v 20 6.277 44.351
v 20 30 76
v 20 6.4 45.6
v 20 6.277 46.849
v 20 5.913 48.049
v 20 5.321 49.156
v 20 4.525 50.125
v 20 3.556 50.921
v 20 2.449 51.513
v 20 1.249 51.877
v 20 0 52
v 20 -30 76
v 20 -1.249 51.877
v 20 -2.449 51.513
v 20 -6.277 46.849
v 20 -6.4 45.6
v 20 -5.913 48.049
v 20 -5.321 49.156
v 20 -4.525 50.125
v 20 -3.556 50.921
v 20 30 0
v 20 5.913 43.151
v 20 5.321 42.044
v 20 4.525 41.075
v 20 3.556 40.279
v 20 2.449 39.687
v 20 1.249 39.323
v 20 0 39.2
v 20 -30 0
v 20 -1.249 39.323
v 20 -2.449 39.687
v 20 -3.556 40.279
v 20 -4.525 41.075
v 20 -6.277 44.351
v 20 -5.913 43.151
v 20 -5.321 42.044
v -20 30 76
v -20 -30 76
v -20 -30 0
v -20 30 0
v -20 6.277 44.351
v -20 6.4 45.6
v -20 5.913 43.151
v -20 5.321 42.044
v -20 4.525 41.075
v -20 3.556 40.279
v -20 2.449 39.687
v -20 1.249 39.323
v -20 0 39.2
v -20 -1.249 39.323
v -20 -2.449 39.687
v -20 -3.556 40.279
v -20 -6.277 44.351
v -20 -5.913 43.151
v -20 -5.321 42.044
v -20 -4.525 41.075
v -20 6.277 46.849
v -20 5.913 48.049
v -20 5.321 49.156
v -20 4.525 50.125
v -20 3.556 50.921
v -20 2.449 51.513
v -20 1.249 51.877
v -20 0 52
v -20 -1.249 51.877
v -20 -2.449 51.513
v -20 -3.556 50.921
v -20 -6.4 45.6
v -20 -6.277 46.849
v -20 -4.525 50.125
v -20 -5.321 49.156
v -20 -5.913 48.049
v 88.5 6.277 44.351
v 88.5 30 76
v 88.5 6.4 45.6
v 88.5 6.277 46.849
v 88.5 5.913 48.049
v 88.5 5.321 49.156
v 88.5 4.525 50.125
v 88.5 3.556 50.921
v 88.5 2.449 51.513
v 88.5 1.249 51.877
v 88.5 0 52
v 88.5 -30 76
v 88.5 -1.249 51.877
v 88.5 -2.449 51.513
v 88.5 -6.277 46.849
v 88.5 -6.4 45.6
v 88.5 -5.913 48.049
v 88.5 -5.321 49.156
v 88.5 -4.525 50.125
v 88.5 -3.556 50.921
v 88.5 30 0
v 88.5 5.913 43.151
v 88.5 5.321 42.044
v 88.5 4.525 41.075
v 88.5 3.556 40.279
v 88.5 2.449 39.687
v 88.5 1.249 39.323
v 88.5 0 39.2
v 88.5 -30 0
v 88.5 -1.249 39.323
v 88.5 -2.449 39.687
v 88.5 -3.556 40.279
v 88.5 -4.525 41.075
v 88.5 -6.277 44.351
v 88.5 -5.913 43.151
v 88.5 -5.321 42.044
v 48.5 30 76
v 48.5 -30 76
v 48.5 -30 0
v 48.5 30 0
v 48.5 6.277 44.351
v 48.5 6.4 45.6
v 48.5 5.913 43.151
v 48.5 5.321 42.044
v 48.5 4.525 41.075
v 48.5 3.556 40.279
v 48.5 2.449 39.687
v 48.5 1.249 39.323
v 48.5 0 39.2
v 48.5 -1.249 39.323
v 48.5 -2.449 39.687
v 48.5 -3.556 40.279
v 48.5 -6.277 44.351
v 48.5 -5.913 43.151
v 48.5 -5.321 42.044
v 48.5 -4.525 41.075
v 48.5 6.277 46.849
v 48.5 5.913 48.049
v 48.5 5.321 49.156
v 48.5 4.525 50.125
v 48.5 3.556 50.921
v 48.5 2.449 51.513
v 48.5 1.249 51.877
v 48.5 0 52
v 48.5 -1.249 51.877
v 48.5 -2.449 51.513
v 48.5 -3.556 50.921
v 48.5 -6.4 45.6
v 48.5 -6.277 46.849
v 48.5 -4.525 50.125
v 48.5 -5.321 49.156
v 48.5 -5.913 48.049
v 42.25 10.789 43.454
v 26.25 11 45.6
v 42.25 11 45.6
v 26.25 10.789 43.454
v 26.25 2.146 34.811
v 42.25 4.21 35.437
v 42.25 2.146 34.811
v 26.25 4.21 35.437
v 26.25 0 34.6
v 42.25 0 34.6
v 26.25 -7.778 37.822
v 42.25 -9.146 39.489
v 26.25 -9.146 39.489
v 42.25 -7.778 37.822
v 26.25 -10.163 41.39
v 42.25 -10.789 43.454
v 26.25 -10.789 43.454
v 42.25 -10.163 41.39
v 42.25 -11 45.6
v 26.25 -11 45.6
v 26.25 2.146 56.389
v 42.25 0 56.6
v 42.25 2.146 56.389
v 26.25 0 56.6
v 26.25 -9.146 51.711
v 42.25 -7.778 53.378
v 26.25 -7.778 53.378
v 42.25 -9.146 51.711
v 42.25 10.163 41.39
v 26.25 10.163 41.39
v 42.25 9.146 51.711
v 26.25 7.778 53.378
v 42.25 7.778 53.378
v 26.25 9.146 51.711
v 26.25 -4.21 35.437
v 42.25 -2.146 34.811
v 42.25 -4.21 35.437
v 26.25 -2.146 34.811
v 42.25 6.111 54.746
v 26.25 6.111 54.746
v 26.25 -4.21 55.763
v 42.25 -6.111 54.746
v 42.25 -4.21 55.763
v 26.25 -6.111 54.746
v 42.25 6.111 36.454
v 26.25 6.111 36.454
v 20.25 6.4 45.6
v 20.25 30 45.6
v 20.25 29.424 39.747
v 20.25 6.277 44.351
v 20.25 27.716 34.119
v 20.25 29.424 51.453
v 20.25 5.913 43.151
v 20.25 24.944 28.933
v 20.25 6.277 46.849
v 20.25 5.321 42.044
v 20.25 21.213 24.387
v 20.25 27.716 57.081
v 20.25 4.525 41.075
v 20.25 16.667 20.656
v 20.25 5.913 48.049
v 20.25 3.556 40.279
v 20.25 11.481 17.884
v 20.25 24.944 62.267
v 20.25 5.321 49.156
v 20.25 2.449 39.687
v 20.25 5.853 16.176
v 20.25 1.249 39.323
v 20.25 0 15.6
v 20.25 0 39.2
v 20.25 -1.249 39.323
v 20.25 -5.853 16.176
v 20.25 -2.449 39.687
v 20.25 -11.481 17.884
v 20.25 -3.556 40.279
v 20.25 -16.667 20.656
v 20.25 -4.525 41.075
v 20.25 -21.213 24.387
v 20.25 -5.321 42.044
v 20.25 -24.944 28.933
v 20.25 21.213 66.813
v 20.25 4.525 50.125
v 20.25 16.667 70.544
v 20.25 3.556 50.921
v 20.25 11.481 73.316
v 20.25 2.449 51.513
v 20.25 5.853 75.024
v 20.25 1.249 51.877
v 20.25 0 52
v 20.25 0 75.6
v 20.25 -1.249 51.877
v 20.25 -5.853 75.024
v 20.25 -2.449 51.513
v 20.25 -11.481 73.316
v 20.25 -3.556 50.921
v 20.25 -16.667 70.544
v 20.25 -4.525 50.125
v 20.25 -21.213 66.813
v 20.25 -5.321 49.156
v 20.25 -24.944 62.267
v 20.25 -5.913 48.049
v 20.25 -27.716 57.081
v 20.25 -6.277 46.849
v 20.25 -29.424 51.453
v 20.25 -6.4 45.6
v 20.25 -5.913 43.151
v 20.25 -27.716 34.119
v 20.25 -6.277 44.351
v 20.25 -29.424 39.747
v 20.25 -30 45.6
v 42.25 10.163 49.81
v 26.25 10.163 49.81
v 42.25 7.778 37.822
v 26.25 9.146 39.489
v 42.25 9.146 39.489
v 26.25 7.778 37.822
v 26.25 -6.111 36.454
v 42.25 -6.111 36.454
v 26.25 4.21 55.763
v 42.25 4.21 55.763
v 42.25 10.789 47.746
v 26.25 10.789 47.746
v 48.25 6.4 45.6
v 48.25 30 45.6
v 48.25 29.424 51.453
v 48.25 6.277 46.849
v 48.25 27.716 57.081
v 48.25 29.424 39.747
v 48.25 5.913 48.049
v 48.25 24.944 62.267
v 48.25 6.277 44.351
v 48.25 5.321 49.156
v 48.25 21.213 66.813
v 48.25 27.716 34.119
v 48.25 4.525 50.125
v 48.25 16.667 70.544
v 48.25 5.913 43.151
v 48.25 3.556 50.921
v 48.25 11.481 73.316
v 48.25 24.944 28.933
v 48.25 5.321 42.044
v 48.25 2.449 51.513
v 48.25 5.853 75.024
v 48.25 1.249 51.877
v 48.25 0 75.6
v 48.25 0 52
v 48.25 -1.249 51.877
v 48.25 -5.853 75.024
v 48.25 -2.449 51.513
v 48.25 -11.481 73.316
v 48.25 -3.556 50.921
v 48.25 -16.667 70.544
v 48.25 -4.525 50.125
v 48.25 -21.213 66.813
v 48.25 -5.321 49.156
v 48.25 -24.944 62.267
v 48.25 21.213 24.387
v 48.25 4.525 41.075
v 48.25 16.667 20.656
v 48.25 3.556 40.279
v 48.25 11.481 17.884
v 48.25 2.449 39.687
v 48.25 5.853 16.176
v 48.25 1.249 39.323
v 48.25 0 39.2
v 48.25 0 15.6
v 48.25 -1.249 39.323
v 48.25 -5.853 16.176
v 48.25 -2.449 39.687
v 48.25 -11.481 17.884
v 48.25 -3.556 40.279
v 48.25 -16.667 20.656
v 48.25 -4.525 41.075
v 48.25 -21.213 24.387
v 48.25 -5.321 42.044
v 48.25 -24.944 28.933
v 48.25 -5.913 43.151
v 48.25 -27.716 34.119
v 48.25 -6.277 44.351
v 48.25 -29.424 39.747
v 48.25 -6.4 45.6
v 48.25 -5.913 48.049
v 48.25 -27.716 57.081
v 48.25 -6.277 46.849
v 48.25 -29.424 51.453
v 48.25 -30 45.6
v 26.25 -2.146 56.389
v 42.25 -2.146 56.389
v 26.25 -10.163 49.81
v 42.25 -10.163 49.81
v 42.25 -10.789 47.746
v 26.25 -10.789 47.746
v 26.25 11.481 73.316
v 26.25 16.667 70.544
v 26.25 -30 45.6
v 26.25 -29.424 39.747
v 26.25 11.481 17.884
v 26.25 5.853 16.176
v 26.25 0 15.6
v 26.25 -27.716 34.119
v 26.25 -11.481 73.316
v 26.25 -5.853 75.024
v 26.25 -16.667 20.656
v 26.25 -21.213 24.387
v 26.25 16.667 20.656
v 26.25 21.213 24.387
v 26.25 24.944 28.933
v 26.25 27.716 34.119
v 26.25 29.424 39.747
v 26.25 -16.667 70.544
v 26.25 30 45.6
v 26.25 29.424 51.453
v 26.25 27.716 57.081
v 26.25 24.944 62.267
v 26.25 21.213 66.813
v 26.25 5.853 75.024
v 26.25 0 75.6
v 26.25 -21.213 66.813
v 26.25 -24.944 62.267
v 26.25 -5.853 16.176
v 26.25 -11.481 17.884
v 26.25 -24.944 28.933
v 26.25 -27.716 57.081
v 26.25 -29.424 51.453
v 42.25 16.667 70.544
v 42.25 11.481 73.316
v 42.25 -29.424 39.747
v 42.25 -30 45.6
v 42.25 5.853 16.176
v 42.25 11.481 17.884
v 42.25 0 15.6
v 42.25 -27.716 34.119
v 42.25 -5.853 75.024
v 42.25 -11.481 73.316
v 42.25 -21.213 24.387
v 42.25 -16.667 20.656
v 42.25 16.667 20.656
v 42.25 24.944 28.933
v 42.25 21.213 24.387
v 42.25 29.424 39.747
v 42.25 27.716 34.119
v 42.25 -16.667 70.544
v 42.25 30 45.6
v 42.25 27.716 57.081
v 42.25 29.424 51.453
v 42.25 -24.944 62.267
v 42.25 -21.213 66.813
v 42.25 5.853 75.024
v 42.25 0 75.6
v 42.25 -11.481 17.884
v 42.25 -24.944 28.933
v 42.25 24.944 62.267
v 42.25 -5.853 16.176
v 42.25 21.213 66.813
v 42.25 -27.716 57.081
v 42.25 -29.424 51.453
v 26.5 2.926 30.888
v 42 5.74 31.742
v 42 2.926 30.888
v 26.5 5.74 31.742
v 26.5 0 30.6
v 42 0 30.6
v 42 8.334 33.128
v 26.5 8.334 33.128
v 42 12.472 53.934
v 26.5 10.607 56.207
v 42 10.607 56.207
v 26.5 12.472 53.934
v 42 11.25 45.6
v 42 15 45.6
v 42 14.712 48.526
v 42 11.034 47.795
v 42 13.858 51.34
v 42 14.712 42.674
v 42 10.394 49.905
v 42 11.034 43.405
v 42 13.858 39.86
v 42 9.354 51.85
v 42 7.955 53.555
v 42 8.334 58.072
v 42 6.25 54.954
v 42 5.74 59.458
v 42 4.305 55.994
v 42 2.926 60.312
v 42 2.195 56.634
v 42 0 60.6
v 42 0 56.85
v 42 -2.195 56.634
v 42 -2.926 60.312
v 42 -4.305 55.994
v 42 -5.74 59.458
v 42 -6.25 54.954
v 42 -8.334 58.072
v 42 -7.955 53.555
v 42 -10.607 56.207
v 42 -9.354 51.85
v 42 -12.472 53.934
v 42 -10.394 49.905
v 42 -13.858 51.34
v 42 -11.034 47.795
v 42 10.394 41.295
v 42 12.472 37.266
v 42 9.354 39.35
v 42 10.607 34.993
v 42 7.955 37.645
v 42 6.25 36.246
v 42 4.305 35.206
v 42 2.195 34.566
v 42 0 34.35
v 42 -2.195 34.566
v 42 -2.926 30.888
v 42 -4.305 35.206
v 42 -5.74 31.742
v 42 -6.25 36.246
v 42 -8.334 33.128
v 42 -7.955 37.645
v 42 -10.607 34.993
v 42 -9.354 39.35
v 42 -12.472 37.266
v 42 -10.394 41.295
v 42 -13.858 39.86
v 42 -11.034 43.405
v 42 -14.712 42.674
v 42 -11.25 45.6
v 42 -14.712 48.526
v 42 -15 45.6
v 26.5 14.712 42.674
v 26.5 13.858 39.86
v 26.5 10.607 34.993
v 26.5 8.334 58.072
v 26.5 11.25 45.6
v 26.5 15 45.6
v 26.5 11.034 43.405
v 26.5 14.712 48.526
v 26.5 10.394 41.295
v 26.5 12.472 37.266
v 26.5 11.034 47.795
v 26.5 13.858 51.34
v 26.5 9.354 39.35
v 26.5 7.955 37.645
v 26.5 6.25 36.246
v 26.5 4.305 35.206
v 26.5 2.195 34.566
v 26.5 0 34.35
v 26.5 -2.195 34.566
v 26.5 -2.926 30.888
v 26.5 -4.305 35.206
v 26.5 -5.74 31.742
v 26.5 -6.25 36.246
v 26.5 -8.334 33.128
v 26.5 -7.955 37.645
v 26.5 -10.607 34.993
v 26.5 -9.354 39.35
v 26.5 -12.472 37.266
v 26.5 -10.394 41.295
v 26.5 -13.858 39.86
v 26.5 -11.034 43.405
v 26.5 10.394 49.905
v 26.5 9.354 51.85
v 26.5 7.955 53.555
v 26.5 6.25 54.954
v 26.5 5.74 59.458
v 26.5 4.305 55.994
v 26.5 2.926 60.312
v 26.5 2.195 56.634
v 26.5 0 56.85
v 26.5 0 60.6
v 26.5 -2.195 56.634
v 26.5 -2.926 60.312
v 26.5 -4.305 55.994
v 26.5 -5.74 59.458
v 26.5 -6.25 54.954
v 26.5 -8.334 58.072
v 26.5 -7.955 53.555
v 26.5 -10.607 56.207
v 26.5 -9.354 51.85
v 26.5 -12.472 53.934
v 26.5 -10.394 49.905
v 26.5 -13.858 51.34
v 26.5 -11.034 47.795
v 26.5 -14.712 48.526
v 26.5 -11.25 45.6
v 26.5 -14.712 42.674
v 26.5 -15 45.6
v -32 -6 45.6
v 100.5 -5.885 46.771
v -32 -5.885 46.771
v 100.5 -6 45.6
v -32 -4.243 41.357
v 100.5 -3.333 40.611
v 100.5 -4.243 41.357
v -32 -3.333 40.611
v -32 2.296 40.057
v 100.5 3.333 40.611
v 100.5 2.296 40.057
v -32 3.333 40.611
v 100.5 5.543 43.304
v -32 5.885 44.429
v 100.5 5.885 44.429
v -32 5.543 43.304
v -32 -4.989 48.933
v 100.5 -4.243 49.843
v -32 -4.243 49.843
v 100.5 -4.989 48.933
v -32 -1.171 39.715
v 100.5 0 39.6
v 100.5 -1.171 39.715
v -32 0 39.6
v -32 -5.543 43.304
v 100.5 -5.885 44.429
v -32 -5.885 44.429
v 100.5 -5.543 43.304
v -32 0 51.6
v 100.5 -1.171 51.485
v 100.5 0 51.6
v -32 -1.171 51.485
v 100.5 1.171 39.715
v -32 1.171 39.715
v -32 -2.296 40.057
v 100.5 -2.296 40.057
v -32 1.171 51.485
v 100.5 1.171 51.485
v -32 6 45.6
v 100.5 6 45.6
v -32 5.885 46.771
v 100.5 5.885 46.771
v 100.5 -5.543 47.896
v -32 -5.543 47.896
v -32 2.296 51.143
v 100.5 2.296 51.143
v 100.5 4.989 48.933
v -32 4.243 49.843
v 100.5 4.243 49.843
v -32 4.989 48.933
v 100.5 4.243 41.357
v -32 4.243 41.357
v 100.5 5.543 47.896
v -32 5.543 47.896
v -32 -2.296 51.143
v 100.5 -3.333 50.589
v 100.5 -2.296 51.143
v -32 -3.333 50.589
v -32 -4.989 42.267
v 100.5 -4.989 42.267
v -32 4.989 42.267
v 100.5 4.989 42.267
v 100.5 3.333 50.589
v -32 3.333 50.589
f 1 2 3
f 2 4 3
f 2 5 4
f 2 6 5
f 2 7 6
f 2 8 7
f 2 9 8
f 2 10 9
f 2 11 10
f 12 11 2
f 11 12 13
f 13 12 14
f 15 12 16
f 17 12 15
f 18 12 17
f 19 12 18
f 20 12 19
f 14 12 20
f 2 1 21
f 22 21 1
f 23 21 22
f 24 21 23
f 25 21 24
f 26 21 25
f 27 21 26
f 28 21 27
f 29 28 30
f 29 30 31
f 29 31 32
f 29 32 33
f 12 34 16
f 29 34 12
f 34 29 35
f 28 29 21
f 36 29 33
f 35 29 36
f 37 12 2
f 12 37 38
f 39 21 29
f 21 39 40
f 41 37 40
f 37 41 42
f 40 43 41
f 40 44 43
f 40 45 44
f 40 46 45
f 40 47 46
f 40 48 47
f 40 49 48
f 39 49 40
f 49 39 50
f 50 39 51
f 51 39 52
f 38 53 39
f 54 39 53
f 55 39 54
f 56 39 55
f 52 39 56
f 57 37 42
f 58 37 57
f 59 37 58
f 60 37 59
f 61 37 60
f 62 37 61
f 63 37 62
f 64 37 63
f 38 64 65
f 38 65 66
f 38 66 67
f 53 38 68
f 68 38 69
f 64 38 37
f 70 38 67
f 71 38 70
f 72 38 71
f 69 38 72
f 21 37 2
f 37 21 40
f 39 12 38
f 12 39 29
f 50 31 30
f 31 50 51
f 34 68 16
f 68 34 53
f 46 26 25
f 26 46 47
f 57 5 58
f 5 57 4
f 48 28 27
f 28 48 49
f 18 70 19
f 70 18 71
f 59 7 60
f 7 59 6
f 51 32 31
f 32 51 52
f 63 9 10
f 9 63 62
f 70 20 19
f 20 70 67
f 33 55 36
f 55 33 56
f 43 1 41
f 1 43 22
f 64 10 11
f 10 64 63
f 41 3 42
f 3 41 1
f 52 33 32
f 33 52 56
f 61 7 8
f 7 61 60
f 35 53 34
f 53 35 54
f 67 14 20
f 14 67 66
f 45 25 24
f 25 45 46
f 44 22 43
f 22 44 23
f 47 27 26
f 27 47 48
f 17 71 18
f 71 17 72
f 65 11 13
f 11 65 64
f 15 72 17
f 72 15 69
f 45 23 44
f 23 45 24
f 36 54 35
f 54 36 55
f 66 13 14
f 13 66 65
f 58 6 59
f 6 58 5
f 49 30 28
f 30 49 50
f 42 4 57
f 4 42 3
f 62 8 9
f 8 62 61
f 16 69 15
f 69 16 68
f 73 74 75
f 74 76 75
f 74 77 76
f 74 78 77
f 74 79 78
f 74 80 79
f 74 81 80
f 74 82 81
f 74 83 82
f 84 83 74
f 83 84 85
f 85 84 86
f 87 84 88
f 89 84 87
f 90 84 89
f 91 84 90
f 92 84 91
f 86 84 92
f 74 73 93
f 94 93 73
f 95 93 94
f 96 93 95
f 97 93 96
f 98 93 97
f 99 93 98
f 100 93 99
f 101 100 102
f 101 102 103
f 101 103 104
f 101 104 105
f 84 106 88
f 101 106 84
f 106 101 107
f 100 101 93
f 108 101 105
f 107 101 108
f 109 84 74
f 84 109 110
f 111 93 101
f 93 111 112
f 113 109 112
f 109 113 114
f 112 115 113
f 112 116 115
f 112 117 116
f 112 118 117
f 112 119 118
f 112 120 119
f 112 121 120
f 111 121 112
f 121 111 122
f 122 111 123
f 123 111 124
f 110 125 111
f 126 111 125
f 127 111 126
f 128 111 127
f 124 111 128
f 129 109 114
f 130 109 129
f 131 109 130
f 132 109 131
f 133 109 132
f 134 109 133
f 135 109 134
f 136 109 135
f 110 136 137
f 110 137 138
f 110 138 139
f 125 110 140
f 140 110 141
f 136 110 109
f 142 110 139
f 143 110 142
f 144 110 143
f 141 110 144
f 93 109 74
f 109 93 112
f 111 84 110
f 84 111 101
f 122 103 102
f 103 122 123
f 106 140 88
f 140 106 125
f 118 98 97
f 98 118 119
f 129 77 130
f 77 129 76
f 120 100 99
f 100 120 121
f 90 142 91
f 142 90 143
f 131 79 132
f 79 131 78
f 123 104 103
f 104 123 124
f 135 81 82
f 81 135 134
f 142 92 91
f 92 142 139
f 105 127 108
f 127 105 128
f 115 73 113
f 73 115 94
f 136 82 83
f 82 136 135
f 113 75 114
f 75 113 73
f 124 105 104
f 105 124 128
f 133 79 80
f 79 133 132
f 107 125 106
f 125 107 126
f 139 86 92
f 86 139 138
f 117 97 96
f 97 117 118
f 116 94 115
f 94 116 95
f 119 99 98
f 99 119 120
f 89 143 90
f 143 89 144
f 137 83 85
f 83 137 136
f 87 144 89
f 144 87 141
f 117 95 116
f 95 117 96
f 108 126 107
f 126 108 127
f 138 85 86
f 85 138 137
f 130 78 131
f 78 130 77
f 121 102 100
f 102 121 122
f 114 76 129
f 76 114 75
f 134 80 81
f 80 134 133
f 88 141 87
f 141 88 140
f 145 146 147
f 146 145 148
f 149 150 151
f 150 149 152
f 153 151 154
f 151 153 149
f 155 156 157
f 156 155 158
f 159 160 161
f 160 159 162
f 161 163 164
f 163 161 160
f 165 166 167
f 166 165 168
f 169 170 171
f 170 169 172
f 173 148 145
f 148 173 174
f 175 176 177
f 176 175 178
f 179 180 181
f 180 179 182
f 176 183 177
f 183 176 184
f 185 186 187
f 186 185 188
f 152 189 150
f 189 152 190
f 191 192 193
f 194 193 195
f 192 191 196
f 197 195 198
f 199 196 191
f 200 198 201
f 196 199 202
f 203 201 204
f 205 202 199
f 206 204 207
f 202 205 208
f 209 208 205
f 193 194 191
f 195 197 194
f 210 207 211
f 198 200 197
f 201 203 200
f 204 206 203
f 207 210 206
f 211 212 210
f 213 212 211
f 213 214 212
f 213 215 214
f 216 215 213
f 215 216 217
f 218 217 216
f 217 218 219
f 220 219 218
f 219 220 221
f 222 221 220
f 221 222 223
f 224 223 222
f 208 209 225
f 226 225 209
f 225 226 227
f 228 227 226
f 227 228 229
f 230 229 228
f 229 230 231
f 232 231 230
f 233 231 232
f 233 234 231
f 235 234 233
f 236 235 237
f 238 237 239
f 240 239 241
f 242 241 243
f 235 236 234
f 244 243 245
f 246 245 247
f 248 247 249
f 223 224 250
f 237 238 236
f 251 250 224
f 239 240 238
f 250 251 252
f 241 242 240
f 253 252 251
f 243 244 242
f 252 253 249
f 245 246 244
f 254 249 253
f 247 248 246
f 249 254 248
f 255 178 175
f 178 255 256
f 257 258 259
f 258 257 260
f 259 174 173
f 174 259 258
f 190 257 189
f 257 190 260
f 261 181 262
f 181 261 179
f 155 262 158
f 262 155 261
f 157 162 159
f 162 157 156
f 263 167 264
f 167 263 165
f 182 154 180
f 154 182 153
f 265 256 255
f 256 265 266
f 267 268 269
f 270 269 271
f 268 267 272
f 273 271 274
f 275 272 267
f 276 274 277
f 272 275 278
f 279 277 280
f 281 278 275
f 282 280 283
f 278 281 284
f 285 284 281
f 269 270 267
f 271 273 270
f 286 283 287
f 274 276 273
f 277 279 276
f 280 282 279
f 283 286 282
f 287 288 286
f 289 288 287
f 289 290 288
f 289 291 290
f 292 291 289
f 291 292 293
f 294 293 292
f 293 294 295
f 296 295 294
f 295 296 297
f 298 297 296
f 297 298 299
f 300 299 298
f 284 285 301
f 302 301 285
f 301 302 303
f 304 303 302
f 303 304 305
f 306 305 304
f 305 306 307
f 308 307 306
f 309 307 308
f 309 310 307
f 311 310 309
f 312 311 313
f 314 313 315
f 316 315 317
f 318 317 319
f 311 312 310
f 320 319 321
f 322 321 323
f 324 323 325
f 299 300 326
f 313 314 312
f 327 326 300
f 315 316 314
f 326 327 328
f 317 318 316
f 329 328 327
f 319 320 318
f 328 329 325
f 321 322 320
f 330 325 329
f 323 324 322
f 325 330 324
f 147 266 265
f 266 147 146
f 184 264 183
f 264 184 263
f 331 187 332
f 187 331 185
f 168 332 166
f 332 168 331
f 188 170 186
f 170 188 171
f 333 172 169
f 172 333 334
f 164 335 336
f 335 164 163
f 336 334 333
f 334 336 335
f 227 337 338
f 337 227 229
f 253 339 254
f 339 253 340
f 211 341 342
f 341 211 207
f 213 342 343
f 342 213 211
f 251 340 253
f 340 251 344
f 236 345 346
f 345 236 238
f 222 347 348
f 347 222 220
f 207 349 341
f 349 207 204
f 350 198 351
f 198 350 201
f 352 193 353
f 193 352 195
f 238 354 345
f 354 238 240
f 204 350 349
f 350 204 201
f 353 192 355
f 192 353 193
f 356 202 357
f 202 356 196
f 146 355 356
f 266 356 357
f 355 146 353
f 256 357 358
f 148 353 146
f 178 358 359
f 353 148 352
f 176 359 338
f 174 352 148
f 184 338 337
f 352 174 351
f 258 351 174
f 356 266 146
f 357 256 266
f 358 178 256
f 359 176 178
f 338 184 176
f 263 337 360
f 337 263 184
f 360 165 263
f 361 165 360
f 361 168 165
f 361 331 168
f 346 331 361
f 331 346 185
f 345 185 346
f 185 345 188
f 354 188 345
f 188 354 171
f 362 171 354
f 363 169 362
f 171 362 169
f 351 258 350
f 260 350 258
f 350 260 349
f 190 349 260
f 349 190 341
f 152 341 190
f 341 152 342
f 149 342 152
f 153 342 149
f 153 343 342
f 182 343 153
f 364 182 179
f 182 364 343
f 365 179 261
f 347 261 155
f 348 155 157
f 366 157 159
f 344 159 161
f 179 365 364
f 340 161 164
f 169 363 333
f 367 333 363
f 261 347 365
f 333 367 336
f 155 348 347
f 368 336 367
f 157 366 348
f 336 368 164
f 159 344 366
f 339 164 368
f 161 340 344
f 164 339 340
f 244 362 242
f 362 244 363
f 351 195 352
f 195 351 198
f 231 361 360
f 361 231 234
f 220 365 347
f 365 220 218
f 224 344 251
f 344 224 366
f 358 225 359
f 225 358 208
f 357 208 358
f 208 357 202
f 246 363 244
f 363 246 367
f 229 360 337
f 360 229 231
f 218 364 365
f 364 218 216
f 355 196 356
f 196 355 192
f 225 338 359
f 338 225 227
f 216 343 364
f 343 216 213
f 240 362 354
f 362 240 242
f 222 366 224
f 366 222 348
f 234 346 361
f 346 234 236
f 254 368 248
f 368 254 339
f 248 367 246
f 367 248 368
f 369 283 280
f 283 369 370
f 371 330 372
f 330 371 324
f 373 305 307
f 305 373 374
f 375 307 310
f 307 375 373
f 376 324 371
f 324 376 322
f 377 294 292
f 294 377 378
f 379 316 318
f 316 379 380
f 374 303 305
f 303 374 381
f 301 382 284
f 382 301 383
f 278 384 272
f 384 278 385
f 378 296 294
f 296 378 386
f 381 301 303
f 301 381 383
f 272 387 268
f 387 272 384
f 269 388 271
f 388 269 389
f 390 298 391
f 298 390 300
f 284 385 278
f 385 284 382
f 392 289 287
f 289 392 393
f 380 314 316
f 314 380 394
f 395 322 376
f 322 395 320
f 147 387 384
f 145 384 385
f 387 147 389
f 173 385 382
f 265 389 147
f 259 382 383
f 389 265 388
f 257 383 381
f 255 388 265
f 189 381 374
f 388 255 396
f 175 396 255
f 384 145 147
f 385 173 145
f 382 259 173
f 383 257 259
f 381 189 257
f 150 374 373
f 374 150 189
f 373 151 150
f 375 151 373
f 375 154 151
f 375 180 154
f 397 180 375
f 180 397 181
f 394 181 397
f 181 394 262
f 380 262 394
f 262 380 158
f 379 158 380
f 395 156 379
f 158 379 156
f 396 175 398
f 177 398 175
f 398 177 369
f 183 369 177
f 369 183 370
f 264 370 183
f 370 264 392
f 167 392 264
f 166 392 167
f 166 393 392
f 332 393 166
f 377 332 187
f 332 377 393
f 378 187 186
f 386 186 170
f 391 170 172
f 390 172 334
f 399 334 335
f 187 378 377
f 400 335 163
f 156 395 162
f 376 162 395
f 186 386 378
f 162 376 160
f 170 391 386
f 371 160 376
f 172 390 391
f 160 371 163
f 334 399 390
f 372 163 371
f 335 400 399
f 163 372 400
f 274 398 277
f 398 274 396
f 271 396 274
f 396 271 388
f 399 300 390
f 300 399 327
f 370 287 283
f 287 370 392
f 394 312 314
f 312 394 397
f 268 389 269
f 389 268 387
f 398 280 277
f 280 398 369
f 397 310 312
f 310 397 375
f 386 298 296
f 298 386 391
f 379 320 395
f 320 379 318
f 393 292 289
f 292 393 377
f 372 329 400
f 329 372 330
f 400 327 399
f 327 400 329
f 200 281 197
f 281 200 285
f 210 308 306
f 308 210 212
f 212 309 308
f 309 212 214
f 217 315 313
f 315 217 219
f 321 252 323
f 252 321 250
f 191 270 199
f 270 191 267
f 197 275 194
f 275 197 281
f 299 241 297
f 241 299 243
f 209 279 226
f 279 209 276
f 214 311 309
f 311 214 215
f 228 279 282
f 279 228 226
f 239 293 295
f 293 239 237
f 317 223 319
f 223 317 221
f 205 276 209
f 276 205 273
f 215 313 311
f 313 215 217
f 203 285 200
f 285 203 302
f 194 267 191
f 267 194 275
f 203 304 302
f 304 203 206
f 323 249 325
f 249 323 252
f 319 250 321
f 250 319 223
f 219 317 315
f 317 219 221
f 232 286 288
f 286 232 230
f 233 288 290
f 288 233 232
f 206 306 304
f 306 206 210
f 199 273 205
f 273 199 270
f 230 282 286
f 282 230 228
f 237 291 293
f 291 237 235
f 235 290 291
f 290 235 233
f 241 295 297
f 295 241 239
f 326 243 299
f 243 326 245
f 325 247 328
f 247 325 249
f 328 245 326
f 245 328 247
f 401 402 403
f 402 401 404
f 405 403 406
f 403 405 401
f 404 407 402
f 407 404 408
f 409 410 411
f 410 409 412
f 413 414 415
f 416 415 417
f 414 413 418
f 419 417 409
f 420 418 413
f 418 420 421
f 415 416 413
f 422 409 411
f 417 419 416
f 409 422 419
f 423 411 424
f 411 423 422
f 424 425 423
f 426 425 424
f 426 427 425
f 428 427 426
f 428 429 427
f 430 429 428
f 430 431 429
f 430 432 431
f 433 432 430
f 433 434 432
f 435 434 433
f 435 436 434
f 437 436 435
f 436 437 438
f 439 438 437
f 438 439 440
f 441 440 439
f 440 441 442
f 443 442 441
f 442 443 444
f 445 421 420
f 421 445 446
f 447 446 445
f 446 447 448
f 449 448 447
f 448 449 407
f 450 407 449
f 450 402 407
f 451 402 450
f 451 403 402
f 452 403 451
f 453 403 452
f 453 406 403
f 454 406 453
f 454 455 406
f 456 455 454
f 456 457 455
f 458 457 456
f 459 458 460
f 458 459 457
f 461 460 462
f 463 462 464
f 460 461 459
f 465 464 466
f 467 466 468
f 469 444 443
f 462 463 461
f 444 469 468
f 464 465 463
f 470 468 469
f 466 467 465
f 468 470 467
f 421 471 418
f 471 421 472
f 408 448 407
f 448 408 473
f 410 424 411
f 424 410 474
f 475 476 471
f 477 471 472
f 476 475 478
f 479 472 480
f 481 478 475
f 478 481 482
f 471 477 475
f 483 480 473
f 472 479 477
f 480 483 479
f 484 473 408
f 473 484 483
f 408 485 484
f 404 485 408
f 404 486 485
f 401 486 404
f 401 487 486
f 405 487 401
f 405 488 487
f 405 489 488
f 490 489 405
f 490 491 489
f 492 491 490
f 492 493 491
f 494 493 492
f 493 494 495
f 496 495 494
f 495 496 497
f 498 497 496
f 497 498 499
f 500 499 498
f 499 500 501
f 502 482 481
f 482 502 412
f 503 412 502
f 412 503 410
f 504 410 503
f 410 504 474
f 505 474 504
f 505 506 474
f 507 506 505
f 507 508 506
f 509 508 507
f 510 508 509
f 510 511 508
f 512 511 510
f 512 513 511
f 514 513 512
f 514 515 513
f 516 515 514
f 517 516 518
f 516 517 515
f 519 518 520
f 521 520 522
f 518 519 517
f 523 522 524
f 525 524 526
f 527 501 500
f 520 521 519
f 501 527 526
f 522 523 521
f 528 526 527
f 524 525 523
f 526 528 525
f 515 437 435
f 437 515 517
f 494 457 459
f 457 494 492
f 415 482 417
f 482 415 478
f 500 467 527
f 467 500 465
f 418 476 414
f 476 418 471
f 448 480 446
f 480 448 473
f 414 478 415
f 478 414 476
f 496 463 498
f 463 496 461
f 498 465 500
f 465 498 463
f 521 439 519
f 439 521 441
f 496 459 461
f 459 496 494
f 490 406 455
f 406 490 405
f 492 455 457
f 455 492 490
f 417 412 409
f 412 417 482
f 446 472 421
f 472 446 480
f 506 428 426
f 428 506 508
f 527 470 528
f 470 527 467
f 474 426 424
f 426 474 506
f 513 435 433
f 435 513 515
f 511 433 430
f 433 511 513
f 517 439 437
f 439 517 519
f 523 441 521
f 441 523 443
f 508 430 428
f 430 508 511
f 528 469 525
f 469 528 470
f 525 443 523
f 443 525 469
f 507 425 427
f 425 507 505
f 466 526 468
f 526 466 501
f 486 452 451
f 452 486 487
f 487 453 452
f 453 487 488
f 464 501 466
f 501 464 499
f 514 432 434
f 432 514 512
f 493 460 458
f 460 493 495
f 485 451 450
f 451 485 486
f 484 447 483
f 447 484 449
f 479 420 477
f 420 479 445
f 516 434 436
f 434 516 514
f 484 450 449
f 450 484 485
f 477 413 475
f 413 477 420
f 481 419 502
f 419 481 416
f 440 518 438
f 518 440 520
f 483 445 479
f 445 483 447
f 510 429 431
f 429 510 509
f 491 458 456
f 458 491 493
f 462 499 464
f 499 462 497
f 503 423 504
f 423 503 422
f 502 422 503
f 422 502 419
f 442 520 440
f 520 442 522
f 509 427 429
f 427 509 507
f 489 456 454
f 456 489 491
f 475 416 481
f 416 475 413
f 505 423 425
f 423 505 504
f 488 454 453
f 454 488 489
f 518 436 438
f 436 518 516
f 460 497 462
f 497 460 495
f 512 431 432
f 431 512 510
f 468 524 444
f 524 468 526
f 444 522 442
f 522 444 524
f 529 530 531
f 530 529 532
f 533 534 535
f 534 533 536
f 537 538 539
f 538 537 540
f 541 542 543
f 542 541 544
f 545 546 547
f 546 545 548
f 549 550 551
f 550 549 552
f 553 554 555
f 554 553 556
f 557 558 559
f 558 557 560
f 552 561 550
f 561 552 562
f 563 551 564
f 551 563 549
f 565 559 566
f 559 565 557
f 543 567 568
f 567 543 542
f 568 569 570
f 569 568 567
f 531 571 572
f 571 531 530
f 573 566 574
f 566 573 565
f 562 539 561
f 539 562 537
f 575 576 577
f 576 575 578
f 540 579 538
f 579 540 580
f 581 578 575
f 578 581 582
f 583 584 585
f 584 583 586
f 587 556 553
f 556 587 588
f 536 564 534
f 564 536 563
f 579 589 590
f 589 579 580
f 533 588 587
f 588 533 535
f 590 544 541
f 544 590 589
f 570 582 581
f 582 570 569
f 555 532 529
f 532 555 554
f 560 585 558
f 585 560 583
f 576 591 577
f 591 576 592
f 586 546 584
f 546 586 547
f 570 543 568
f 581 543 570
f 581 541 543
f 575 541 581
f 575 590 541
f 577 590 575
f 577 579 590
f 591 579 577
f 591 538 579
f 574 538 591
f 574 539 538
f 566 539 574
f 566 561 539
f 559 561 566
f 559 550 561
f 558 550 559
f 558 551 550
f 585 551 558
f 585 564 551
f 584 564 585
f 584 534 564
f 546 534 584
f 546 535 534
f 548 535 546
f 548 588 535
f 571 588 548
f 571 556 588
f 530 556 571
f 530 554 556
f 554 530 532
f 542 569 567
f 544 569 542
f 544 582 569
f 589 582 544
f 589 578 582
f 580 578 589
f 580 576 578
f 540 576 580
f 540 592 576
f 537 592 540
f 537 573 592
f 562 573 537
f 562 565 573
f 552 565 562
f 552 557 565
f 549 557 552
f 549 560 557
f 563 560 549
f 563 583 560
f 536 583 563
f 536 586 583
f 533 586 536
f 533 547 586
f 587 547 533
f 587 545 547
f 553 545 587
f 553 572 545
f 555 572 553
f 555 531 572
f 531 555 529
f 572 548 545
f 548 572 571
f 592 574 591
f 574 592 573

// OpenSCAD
$fn = 32;

// ------------------------------------------------------------------------
// Pulley assembly: d60 pulley with a belt, shaft d12
// Every part is its own module, assembly() places them once.
// ------------------------------------------------------------------------

// --- part 1 ---
module support1() {
  difference() {
    translate([-20, -30, 0]) cube([40, 60, 76]);
    translate([0, 0, 45.6]) rotate([0, 90, 0]) cylinder(h = 42, d = 12.8, center = true);
  }
}

// --- part 2 ---
module support2() {
  difference() {
    translate([-20, -30, 0]) cube([40, 60, 76]);
    translate([0, 0, 45.6]) rotate([0, 90, 0]) cylinder(h = 42, d = 12.8, center = true);
  }
}

// --- part 3 ---
module shaft() {
  translate([0, 0, -66.25]) cylinder(h = 132.5, d = 12);
}

// --- part 4 ---
module pulley() {
  difference() {
    union() {
      cylinder(h = 28, d = 22);
      cylinder(h = 6, d = 60);
      translate([0, 0, 22]) cylinder(h = 6, d = 60);
    }
    translate([0, 0, -1]) cylinder(h = 30, d = 12.8);
  }
}

// --- part 5 ---
module belt() {
  difference() {
      translate([0, 0, 0]) cylinder(h = 15.5, d = 30);
      translate([0, 0, -1]) cylinder(h = 17.5, d = 22.5);
    }
}

// --- assembly ---
module assembly() {
  translate([0, 0, 0]) rotate([0, 0, 0]) support1();
  translate([68.5, 0, 0]) rotate([0, 0, 0]) support2();
  translate([34.25, 0, 45.6]) rotate([0, 90, 0]) shaft();
  translate([20.25, 0, 45.6]) rotate([0, 90, 0]) pulley();
  translate([26.5, 0, 45.6]) rotate([0, 90, 0]) belt();
}

assembly();
